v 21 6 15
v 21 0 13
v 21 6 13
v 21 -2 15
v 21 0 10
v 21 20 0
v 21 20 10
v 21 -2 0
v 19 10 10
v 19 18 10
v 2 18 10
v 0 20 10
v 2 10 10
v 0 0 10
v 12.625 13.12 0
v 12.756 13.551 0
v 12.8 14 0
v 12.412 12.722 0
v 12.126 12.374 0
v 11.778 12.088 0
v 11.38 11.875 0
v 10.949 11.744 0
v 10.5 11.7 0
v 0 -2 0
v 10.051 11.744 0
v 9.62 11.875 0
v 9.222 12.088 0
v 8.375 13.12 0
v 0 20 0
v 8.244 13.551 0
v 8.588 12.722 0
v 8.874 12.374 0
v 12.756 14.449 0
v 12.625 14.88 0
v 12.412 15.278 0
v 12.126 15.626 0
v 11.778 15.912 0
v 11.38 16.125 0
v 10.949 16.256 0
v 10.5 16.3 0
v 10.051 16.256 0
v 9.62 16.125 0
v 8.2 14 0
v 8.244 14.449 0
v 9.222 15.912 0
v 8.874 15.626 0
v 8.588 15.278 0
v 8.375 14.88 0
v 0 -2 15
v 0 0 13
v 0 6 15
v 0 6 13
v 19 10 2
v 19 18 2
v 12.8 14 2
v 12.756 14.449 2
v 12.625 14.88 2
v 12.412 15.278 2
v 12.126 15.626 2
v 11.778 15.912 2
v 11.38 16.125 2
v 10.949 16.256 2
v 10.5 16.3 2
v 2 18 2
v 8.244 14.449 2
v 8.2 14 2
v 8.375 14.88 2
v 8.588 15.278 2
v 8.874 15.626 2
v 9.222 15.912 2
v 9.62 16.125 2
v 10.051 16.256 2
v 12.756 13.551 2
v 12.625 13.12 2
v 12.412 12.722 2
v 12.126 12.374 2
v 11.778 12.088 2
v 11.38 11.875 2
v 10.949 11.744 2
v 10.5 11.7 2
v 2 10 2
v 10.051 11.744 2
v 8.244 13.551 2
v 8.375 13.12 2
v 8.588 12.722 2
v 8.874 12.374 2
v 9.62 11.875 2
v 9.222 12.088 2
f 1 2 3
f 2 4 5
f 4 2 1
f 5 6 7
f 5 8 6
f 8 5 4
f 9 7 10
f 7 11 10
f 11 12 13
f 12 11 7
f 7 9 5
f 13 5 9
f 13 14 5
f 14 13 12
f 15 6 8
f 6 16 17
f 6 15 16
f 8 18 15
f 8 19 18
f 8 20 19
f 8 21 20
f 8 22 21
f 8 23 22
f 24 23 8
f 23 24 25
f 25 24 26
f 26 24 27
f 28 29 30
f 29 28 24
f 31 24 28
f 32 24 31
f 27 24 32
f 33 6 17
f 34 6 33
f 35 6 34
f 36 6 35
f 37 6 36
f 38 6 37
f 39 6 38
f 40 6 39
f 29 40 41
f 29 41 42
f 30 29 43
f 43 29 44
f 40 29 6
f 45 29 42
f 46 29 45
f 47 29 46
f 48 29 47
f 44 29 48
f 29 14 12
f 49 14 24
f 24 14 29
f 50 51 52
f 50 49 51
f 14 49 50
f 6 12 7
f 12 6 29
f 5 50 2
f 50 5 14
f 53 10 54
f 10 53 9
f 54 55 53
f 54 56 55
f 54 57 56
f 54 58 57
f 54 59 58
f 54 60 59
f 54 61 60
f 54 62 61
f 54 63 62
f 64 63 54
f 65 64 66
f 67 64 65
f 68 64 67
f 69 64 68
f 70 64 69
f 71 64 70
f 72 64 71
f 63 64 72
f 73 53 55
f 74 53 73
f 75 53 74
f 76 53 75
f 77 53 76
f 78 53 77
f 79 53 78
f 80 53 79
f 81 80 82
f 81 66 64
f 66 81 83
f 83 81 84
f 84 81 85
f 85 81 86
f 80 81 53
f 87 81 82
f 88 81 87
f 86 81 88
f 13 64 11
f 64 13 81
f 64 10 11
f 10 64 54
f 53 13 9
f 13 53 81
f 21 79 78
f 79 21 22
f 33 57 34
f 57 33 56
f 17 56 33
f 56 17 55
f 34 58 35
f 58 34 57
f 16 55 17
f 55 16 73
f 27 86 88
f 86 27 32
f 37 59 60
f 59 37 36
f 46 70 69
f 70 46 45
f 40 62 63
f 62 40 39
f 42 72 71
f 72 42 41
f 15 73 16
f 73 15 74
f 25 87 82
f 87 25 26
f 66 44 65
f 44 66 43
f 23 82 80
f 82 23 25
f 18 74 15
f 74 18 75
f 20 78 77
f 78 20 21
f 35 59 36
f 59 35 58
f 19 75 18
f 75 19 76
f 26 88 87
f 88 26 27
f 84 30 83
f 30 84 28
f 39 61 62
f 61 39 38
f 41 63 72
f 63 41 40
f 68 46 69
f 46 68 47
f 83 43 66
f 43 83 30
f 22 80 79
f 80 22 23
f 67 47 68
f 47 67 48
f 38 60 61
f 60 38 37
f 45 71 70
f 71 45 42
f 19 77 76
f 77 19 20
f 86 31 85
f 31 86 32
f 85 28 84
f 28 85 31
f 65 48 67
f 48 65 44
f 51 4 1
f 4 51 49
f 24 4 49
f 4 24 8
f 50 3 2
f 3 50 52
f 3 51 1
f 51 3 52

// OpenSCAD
$fn=32;
width = 21;
thickness = 2;
wall_thickness = 2;
box_thickness = 10;
bottom_thickness = 3;
overhang = 6;
channel_width = 12;
screw_hole_radius = 2.3;

union() {
  difference() {
    cube([width, overhang + wall_thickness + channel_width, box_thickness]);
      
    translate([thickness, overhang + wall_thickness + thickness, thickness])
    cube([width - 2*thickness, channel_width - 2*thickness, box_thickness]);
      
    translate([width/2, overhang + wall_thickness + channel_width/2, -1])
    cylinder(h=thickness+2, r=screw_hole_radius);
  }
    
  translate([0, -thickness, 0])
  cube([width, thickness, box_thickness + bottom_thickness + thickness]);
   
  translate([0, 0, box_thickness + bottom_thickness])
  cube([width, overhang, thickness]);
   
}
